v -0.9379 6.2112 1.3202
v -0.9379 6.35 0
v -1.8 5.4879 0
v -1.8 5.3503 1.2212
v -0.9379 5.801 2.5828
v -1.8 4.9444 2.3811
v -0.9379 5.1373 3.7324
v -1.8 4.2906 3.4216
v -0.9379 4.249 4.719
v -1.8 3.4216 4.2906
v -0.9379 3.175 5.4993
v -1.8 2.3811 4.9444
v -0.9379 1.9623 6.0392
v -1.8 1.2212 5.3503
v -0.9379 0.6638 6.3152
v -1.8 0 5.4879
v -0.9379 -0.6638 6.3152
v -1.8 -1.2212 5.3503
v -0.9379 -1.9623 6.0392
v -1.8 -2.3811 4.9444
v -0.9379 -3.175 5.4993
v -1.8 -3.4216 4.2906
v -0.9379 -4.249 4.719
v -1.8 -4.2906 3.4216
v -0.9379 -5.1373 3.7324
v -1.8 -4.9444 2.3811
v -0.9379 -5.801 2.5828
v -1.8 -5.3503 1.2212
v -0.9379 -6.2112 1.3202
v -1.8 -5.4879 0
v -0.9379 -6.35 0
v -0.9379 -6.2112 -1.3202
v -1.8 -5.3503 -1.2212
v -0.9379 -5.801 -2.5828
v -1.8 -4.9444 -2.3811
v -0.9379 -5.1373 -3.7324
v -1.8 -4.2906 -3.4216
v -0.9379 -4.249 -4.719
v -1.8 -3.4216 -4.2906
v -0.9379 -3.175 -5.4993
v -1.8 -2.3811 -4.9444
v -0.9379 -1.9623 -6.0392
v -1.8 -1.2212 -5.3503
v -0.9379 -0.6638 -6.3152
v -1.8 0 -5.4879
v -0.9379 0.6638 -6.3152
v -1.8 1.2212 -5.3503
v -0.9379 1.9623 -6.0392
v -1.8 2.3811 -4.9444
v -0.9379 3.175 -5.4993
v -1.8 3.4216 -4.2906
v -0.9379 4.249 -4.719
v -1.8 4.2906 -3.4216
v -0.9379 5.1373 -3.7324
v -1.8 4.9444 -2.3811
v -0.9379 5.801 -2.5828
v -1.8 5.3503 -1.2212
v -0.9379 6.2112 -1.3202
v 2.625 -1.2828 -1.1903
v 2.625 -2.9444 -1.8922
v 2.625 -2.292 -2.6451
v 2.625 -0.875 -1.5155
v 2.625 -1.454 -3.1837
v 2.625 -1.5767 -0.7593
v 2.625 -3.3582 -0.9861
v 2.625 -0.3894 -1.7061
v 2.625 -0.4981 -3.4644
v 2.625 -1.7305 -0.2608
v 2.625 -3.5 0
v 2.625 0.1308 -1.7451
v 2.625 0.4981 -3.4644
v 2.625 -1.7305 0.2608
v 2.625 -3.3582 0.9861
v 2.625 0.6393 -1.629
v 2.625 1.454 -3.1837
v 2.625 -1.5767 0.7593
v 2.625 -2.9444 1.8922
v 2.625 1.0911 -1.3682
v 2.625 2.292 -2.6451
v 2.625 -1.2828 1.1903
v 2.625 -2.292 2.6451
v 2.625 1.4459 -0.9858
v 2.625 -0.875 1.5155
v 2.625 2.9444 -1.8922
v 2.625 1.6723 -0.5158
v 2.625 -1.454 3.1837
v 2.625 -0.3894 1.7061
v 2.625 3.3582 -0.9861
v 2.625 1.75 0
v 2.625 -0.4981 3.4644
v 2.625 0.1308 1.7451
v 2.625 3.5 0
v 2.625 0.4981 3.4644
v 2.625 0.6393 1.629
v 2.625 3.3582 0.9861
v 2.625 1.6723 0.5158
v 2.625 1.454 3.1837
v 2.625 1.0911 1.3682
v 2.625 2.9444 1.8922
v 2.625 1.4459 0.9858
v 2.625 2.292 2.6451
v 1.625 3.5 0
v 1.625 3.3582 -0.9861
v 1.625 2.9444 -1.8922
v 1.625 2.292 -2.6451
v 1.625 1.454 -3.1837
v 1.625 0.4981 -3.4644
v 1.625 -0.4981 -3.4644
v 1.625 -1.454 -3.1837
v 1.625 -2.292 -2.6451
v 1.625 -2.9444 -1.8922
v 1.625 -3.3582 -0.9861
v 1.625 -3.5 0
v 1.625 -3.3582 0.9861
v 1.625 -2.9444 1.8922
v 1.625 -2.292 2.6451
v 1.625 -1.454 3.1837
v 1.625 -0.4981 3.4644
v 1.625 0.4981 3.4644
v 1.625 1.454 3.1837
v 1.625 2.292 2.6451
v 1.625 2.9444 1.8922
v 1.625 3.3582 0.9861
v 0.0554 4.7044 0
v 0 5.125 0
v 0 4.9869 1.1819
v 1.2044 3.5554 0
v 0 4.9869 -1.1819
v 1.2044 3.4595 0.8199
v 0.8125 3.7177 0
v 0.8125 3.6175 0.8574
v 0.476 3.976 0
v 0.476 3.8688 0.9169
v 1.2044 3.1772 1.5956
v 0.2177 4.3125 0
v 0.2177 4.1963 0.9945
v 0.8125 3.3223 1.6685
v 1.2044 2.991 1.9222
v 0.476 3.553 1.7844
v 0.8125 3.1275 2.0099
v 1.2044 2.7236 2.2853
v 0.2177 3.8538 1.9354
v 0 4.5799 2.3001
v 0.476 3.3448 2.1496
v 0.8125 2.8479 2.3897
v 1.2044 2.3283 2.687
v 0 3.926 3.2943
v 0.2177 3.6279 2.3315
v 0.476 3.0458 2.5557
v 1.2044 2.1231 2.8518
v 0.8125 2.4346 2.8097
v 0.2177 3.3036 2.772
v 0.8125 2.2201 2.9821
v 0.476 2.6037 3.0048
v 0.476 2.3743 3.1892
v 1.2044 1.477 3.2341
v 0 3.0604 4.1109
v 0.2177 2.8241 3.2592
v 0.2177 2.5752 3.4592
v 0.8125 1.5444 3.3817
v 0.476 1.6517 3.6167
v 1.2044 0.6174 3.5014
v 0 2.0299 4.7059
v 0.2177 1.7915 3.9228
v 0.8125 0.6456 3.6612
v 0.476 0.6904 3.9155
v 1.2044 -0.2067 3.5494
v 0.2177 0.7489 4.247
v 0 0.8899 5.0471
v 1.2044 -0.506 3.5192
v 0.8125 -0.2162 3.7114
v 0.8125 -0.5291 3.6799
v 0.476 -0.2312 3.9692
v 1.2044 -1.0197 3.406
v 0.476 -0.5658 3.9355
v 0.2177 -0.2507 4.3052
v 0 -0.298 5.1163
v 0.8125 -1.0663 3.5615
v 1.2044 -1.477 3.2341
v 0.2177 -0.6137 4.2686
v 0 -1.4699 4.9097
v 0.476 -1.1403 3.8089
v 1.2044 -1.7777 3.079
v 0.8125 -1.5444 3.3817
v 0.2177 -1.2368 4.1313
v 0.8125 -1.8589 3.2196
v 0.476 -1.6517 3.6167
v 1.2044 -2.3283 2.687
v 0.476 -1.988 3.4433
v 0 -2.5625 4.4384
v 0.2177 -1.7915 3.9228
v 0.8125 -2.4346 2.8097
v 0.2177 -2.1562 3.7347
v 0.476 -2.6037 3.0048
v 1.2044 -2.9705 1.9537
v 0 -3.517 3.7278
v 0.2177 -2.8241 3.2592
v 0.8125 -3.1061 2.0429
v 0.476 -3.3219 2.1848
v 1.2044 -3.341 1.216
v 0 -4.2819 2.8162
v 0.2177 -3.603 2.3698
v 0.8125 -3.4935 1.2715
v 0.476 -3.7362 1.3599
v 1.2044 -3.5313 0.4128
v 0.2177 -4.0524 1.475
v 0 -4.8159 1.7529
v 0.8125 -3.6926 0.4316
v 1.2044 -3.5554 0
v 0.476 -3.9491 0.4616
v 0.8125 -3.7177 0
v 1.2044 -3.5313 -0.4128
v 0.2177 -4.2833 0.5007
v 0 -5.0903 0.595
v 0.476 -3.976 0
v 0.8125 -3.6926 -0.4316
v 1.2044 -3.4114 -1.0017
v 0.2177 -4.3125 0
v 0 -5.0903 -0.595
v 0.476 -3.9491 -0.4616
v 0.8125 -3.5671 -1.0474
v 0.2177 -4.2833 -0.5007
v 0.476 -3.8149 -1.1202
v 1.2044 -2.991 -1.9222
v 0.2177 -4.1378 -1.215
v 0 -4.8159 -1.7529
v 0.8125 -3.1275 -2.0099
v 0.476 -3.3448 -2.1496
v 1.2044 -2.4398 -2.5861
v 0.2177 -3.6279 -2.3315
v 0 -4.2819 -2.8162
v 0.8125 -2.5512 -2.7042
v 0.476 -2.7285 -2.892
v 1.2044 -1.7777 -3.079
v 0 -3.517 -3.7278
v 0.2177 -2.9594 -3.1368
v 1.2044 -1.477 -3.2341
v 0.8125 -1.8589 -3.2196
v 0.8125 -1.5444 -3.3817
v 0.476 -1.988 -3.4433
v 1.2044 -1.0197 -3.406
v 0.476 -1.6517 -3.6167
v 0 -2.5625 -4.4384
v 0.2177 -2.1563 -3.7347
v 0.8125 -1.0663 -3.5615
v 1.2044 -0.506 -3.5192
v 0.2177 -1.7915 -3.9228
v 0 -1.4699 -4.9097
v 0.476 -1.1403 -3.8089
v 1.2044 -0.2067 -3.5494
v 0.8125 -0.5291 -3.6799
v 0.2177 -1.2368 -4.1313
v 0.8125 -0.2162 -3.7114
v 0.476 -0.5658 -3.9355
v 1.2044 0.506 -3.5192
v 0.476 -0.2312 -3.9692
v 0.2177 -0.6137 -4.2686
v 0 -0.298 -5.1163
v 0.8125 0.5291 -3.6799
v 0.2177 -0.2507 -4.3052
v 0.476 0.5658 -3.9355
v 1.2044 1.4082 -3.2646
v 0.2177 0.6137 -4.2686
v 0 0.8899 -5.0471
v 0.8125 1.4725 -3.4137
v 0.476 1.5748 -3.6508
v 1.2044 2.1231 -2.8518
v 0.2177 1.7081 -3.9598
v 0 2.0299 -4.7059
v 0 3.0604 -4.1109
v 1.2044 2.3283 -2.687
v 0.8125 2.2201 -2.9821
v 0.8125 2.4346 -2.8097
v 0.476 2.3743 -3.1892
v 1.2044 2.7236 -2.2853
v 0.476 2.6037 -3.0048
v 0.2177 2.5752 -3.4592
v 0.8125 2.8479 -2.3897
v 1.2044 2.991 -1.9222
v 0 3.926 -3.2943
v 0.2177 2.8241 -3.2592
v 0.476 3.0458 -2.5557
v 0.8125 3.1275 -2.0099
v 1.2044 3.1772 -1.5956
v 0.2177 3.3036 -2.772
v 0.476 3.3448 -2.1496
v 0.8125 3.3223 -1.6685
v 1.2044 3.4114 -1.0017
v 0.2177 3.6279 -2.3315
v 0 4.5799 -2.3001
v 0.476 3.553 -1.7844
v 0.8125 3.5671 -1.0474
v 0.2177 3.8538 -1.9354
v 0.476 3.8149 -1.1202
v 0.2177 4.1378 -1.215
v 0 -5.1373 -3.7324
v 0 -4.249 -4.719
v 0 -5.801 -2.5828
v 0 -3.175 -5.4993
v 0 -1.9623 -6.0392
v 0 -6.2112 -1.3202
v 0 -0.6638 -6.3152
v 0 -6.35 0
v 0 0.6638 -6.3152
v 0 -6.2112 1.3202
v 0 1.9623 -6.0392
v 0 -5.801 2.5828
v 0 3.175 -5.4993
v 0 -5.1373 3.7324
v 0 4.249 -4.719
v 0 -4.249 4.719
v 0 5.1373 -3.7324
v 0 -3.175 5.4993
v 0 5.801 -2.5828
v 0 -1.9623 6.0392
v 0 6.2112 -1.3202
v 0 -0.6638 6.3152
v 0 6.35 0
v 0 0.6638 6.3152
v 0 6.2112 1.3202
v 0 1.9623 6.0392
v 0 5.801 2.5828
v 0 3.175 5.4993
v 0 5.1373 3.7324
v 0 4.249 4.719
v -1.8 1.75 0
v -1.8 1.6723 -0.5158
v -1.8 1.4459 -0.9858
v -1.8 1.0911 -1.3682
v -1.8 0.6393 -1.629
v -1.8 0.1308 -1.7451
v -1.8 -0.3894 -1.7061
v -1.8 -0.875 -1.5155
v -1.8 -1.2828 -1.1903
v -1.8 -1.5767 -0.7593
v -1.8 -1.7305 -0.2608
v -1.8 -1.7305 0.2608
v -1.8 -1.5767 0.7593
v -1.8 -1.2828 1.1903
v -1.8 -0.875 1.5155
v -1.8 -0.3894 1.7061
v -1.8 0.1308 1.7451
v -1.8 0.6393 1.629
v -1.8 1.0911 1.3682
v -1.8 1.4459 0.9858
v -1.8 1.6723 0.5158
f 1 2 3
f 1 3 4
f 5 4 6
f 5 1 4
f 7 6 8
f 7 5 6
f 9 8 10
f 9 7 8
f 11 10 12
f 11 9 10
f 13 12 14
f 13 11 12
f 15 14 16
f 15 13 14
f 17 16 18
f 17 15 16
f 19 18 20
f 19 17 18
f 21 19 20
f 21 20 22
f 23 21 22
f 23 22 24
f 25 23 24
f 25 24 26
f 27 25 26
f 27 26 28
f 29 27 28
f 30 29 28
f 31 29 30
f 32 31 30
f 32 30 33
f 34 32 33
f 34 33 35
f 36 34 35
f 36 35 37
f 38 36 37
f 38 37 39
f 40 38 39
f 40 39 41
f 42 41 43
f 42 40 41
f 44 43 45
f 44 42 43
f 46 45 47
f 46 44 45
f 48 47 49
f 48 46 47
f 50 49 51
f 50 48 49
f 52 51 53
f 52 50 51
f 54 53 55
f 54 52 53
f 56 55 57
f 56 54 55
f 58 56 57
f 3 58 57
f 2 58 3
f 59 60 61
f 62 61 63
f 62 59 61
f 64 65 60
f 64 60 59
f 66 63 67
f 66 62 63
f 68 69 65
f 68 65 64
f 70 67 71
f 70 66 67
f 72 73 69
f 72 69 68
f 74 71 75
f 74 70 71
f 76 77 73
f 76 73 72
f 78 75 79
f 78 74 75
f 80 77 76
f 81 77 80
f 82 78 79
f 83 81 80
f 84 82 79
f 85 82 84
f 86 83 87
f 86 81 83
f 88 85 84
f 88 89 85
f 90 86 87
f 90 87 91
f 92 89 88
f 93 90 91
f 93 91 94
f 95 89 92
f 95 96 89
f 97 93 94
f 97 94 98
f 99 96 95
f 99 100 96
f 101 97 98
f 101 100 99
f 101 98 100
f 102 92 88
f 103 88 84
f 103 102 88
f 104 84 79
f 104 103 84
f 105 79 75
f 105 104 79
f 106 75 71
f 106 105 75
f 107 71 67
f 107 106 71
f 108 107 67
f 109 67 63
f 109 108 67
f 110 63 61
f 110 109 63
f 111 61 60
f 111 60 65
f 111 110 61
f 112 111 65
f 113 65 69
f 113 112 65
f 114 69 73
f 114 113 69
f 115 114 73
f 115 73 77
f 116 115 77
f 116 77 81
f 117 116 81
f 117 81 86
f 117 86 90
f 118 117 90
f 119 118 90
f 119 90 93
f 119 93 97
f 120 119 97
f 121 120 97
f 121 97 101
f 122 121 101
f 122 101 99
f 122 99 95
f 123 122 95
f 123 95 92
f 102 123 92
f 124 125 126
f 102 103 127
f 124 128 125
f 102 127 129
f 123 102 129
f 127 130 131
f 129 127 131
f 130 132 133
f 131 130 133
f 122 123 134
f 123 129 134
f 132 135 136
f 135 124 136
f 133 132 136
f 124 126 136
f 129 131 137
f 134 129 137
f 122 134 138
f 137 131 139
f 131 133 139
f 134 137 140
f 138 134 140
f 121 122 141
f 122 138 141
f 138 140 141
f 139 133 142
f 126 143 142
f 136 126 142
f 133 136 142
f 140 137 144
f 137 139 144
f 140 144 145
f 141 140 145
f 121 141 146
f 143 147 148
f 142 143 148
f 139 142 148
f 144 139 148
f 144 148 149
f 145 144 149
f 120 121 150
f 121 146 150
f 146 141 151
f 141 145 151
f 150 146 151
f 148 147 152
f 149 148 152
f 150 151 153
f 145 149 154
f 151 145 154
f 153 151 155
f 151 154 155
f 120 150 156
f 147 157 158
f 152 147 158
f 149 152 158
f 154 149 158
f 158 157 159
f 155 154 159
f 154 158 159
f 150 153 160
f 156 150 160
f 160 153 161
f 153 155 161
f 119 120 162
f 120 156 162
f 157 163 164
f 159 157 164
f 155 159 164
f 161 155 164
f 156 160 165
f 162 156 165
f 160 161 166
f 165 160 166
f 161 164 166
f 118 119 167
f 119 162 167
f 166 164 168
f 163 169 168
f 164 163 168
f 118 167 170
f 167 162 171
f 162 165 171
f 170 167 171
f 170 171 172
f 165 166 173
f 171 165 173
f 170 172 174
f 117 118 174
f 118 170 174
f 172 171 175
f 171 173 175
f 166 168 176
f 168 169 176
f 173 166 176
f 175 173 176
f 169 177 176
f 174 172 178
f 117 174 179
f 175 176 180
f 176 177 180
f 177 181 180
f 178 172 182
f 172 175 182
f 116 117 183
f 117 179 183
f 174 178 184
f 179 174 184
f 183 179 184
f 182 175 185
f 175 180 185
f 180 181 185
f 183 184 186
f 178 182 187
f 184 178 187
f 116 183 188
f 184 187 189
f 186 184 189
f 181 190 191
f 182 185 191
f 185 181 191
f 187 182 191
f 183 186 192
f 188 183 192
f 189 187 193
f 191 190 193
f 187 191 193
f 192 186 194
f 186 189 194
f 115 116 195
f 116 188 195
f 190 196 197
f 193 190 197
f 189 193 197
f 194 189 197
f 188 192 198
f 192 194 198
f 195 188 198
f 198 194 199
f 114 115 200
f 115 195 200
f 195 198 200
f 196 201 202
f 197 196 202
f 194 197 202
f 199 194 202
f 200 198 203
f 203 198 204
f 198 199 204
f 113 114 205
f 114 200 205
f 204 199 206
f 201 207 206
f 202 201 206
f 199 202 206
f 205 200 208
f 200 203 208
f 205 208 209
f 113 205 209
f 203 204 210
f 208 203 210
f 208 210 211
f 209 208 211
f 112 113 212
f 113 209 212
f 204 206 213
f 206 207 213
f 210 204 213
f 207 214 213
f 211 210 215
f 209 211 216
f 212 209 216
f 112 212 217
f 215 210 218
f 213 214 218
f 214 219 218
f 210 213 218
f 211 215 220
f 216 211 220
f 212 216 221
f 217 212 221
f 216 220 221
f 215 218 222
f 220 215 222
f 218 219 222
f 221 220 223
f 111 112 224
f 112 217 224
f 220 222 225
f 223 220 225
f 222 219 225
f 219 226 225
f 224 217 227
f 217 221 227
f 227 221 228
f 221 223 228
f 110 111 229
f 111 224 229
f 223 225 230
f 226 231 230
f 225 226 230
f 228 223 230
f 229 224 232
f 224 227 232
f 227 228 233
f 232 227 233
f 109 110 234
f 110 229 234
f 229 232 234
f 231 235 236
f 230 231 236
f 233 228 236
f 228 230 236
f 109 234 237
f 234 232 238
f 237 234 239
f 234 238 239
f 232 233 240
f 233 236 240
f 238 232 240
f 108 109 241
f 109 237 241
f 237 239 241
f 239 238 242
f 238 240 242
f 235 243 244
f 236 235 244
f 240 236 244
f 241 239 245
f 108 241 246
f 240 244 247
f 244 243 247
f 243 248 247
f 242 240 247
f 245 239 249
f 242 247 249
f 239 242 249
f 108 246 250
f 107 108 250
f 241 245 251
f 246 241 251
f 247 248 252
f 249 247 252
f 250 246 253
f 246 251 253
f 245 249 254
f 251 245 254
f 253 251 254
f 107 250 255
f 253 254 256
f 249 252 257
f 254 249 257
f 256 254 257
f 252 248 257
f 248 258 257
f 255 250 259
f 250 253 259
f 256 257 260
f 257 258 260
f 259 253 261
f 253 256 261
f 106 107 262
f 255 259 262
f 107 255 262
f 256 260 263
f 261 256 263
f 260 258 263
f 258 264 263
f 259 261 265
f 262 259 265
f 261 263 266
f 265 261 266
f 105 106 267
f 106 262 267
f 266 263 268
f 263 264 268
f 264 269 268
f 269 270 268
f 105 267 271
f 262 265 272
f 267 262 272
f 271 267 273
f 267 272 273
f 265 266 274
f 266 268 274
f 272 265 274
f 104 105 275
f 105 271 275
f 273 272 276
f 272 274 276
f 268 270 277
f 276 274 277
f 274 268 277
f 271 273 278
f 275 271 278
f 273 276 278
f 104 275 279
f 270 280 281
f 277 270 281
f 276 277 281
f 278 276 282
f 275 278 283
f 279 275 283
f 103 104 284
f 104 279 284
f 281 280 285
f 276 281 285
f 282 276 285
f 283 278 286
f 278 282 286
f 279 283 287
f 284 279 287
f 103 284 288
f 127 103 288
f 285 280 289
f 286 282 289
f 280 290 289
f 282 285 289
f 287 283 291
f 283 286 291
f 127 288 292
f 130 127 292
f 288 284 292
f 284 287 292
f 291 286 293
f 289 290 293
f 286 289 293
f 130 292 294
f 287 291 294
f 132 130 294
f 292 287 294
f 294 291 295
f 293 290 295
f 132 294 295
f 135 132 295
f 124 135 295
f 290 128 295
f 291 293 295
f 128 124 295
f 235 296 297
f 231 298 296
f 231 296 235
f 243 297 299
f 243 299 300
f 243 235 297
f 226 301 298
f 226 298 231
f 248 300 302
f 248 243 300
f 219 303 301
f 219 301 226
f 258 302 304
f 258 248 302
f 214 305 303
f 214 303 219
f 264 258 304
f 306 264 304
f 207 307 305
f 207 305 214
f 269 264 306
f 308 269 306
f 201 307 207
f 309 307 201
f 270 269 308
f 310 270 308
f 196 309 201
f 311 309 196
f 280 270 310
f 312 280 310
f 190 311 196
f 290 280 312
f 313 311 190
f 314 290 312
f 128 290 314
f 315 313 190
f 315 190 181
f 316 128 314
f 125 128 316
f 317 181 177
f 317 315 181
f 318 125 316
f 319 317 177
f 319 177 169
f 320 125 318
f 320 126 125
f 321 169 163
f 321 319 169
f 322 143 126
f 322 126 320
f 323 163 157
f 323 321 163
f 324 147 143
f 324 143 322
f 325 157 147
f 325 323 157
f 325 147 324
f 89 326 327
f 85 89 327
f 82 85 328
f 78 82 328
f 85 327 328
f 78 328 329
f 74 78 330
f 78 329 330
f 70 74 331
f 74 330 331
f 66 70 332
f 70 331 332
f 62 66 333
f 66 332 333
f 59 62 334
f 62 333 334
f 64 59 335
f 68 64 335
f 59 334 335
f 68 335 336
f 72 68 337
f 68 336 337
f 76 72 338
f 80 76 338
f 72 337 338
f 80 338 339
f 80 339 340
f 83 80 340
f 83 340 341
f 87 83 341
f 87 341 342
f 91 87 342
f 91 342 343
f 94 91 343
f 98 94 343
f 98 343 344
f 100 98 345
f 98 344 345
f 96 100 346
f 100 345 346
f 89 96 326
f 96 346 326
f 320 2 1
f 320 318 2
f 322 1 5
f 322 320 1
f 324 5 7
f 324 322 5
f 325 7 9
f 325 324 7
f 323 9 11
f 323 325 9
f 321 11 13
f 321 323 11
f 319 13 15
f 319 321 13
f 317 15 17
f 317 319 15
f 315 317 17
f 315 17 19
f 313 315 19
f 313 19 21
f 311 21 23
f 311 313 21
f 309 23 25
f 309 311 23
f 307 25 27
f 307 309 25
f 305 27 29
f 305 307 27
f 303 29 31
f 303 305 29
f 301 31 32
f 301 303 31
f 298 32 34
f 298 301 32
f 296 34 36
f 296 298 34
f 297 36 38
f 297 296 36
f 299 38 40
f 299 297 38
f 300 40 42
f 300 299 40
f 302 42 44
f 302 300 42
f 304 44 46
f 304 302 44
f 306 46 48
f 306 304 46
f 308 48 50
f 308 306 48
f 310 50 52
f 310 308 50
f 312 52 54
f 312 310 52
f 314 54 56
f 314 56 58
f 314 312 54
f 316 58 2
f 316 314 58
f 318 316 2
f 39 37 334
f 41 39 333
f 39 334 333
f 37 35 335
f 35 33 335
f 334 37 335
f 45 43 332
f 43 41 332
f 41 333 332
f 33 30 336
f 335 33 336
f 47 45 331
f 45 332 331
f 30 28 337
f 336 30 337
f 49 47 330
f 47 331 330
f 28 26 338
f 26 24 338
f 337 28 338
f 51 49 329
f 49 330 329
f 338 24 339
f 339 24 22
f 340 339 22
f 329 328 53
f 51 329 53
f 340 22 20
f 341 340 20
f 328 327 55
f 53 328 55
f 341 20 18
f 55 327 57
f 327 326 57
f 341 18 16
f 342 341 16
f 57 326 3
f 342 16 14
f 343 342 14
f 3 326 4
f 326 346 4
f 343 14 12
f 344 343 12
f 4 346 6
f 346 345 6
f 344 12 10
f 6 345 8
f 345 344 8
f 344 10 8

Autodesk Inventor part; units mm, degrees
ref_plane "YZ Plane" through (0, 0, 0) normal (1, 0, 0) x (0, 1, 0)
ref_plane "XZ Plane" through (0, 0, 0) normal (0, 1, 0) x (-1, 0, 0)
ref_plane "XY Plane" through (0, 0, 0) normal (0, 0, 1) x (1, 0, 0)
sketch "스케치1" plane through (0, 0, 0) normal (1, 0, 0) x (0, 1, 0)
  circle A0 centre (0, 0) radius 6.5
  circle A1 centre (0, 0) radius 1.75
  circle A2 centre (0, 0) radius 3.5
  dimension "d0" = 13
  dimension "d1" = 3.5
  dimension "d2" = 7
extrude "돌출1" add sketch "스케치1" against normal blind 2 contours A0 | A2
extrude "돌출2" add sketch "스케치1" along normal blind 2.625 contours A2
fillet "모깎기1" radius 1.625 1 edges at (0, -3.5, 0)
chamfer "모따기1" distance 1 angle 45 1 edges at (-2, -6.5, 0)
move faces "이동1" translate (0.2, 0, 0) faces at (-2, 4.1798, -0.5783)
offset faces "크기2" outward -0.15 faces at (-0.3333, 6.4789, -0.523) (-1.2667, -2.6722, -5.6315)
properties part number "축종아리베어링고정_3D 인쇄"
